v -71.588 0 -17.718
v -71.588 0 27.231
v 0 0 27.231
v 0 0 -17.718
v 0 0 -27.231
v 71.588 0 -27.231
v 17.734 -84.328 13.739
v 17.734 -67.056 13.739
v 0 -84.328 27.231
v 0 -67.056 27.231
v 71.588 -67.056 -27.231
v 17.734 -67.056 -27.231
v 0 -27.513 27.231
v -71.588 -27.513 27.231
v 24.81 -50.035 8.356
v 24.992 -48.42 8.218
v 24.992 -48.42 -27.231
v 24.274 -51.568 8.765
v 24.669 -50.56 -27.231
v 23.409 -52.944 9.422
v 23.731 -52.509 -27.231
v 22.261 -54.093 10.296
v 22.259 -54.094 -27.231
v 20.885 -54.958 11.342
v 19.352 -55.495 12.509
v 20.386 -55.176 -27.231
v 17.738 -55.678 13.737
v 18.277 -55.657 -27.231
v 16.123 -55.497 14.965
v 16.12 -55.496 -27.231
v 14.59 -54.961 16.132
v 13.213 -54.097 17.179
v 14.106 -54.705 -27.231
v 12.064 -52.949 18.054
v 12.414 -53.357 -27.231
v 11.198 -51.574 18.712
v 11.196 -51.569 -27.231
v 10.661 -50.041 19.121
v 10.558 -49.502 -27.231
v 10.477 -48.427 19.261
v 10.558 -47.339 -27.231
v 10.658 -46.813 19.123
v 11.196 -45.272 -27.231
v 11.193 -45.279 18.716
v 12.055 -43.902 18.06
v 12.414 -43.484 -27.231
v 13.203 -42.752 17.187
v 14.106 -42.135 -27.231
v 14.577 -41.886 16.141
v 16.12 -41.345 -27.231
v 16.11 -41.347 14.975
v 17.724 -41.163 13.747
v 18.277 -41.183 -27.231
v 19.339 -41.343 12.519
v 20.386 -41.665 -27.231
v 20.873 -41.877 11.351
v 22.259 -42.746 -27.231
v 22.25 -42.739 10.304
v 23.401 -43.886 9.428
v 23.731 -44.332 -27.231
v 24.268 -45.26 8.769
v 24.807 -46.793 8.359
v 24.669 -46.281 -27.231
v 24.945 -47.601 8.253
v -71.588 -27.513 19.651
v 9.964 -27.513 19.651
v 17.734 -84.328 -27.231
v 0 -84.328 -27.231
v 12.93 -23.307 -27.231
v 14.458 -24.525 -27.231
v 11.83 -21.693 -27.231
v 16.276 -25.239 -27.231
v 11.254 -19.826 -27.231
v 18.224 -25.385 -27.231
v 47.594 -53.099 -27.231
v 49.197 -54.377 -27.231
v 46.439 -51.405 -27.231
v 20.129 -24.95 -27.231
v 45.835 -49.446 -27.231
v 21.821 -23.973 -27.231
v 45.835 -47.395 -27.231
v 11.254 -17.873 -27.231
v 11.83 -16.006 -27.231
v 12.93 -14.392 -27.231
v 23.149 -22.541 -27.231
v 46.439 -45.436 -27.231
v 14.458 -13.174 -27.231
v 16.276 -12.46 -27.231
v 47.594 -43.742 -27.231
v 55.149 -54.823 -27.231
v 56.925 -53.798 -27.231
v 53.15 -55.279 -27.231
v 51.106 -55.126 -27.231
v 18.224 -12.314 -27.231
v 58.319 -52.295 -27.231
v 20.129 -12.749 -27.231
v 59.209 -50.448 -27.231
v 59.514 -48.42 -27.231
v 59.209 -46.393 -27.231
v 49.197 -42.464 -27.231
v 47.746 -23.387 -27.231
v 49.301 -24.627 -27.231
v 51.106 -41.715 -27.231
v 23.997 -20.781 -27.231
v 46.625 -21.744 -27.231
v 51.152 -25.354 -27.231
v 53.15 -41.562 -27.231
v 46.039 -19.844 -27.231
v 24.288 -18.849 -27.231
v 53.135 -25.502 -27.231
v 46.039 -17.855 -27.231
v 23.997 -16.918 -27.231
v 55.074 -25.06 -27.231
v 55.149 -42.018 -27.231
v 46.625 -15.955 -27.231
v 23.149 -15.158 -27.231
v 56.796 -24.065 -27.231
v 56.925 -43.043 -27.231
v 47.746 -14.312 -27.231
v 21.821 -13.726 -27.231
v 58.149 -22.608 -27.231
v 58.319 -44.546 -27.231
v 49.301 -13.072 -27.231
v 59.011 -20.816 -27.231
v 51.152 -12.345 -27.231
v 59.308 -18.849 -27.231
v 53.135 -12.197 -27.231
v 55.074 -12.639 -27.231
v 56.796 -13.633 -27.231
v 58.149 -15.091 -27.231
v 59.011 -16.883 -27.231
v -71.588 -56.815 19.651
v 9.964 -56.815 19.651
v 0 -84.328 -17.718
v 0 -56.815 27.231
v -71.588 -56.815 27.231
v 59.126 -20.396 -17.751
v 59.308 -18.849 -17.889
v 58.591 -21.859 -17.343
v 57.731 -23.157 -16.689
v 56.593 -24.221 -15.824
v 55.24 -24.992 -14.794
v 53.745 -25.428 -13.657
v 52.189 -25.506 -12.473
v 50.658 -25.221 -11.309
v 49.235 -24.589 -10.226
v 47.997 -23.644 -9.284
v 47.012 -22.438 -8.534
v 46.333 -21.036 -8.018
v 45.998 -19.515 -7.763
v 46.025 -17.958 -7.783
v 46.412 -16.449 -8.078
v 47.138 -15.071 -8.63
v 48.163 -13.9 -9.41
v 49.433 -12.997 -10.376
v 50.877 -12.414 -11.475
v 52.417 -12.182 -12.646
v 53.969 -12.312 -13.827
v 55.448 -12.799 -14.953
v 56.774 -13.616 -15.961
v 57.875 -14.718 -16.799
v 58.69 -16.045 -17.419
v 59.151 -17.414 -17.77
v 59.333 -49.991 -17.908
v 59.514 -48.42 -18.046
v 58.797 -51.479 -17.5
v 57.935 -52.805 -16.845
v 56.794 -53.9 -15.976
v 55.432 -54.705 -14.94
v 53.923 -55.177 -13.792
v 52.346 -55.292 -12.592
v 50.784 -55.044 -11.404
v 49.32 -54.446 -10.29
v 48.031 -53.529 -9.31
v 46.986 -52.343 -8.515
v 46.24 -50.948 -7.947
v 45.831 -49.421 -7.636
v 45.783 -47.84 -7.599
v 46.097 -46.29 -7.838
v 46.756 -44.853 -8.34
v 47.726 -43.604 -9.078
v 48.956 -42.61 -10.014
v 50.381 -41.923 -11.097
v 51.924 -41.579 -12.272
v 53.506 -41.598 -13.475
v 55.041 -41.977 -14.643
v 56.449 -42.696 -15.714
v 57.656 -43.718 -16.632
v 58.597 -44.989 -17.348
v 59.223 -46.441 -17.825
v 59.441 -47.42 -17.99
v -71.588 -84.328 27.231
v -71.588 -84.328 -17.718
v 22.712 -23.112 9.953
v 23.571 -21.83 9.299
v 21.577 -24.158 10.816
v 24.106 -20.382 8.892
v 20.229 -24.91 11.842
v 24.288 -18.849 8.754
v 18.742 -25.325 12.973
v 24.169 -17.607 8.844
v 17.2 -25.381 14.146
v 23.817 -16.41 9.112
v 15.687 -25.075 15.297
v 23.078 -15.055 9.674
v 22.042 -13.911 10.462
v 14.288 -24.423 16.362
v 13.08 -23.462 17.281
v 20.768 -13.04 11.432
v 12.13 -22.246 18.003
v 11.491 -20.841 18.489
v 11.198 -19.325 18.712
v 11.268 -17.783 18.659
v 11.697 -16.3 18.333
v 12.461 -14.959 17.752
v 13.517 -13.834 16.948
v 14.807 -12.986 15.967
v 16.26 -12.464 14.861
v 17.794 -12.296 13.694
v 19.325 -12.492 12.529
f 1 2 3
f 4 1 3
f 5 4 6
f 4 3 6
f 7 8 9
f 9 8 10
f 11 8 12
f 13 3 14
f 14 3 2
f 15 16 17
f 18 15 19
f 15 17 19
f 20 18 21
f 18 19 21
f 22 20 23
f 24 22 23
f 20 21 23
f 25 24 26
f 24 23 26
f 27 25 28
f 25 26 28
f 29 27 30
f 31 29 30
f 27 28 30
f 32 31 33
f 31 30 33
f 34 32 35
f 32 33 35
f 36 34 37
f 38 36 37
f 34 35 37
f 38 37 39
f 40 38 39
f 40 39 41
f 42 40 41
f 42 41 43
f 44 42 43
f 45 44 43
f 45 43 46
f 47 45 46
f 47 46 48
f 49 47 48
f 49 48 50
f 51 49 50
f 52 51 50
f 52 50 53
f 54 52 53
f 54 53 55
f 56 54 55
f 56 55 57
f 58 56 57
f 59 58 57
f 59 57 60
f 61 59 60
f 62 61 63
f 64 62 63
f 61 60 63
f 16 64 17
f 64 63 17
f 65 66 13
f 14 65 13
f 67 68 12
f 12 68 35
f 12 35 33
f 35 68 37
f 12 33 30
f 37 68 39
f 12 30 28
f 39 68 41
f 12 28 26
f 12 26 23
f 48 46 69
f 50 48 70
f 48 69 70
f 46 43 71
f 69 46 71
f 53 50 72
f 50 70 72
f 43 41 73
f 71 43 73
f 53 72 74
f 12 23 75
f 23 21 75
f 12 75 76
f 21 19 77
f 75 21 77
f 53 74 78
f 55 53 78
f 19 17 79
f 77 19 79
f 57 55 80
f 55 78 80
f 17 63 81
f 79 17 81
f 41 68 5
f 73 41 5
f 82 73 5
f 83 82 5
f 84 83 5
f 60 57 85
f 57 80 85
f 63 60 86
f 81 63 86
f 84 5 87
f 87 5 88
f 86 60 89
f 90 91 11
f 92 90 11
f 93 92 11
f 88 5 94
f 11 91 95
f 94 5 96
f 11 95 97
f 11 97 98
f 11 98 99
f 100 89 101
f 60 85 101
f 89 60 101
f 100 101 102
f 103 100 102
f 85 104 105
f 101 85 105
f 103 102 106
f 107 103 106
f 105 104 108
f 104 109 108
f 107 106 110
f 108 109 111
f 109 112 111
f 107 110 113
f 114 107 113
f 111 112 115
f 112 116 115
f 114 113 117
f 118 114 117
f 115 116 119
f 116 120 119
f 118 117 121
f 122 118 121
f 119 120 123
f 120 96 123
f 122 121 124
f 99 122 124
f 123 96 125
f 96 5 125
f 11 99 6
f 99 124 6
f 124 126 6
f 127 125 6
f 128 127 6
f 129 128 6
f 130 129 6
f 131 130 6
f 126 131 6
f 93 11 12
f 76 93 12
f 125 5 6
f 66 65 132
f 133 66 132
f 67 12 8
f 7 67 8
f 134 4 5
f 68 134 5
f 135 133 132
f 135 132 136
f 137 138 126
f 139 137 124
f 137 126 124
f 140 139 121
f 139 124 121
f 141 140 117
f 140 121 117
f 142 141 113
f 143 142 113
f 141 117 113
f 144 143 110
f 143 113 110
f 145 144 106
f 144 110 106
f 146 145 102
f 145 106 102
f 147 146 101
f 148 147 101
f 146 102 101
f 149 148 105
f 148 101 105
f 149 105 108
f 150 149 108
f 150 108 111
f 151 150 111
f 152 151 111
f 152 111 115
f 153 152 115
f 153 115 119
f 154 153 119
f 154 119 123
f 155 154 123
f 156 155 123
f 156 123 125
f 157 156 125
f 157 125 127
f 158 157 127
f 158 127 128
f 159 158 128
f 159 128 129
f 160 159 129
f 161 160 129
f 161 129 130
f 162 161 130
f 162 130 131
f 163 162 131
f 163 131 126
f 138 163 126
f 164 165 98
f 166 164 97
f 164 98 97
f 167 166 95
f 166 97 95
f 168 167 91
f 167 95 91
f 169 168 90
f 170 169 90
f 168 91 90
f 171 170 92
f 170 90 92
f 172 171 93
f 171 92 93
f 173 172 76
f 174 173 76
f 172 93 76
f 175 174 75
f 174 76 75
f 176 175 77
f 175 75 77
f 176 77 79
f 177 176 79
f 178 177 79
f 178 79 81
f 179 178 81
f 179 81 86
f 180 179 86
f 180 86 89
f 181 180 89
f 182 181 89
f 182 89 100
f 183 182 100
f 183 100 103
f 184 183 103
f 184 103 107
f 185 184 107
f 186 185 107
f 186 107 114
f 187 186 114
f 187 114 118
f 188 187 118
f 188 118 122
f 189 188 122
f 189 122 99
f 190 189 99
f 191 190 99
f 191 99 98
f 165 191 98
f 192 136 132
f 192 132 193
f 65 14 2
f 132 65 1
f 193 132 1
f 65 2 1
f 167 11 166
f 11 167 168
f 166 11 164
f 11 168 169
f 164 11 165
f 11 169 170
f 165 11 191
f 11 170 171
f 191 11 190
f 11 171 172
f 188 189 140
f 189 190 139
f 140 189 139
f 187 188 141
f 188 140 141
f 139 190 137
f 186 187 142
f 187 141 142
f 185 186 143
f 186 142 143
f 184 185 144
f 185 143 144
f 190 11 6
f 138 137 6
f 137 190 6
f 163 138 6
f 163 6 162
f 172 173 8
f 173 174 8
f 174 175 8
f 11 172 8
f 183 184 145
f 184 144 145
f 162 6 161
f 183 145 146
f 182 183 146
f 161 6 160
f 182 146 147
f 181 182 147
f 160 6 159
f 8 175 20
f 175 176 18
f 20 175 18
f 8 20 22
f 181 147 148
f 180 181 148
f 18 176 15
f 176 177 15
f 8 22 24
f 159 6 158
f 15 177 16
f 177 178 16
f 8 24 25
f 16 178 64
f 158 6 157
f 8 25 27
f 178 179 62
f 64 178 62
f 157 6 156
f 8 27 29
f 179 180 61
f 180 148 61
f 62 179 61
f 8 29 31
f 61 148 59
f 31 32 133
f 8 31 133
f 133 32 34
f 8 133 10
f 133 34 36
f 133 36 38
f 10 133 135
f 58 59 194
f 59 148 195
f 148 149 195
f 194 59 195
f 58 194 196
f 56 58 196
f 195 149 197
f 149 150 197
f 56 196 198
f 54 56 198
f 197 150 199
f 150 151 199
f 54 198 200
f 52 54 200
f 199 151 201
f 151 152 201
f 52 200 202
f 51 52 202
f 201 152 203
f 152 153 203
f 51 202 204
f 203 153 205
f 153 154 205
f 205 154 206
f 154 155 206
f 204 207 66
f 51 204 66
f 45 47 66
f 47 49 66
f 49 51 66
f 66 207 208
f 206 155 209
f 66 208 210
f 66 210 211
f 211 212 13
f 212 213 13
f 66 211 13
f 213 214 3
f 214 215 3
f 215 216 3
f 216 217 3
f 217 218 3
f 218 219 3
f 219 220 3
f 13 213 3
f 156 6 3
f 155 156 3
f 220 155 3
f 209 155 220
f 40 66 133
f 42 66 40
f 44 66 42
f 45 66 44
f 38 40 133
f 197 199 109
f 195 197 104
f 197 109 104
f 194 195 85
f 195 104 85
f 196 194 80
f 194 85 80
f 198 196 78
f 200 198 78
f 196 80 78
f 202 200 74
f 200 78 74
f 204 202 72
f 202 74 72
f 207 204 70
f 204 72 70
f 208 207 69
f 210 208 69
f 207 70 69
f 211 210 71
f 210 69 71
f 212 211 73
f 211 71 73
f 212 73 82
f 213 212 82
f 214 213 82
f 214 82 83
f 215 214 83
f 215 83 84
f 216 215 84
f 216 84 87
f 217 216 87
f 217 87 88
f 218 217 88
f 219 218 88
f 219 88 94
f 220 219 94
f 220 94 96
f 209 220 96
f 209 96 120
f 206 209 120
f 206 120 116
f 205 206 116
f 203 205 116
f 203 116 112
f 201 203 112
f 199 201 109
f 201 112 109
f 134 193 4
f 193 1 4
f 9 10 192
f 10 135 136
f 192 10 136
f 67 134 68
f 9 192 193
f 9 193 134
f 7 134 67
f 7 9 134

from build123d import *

# Parameters (mm, degrees)
F1_DEPTH = 67.056
F2_W     = 71.5878978372
F2_H     = 5.1953196526
F3_DEPTH = 186.436
F4_DEPTH = 17.272
F5_DEPTH = 4.318
F6_W     = 29.3028312416
F6_H     = 7.5802523643
F7_DEPTH = 176.784
F8_R     = 7.2573235492
F8_R_2   = 6.8780266073
F8_R_3   = 6.6715099214
F8_R_4   = 6.5534755611
F9_DEPTH = 94.742


with BuildPart() as f1:
    # F0 (on Front) → F1 (new body)
    with BuildSketch(Plane.XZ):
        Polygon((71.5878978372, -27.2314734757), (0, 27.2314734757), (-71.5878978372, 27.2314734757), (-71.5878978372, -27.2314734757), align=None)
    extrude(amount=F1_DEPTH)

    # F2 (on face) → F3 (cut)
    with BuildSketch(Plane.XZ.offset(67.056)):
        with Locations((-35.7939489186, -24.6338136494)):
            Rectangle(F2_W, F2_H)
    extrude(amount=-F3_DEPTH, mode=Mode.SUBTRACT)

    # F2 (on face) → F4 (join)
    with BuildSketch(Plane.XZ.offset(67.056)):
        Polygon((17.7344851975, -27.2314734757), (17.7344851975, 13.739356013), (0, 27.2314734757), (-71.5878978372, 27.2314734757), (-71.5878978372, -22.0361538231), (0, -22.0361538231), (0, -27.2314734757), align=None)
    extrude(amount=F4_DEPTH)

    # F5 (cut): a face of the model
    f5_faces = [f1.faces().sort_by_distance(p)[0] for p in [
        (-35.7939489186, -42.164, -22.0361538231),
    ]]
    extrude(f5_faces, amount=-F5_DEPTH, mode=Mode.SUBTRACT)

    # F6 (on face) → F7 (cut)
    with BuildSketch(Plane(origin=(-71.5878978372, 0, 0), x_dir=(0, -1, 0), z_dir=(-1, 0, 0))):
        with Locations((42.164, 23.4413472936)):
            Rectangle(F6_W, F6_H)
    extrude(amount=-F7_DEPTH, mode=Mode.SUBTRACT)

    # F8 (on face) → F9 (cut)
    with BuildSketch(Plane(origin=(0, 0, -27.2314734757), x_dir=(1, 0, 0), z_dir=(0, 0, -1))):
        with Locations((17.7344851975, 48.4204255044)):
            Circle(F8_R)
        with Locations((52.6362881064, 48.4204255044)):
            Circle(F8_R_2)
        with Locations((52.6362881064, 18.8494753093)):
            Circle(F8_R_3)
        with Locations((17.7344851975, 18.8494753093)):
            Circle(F8_R_4)
    extrude(amount=-F9_DEPTH, mode=Mode.SUBTRACT)


solid = f1.part
